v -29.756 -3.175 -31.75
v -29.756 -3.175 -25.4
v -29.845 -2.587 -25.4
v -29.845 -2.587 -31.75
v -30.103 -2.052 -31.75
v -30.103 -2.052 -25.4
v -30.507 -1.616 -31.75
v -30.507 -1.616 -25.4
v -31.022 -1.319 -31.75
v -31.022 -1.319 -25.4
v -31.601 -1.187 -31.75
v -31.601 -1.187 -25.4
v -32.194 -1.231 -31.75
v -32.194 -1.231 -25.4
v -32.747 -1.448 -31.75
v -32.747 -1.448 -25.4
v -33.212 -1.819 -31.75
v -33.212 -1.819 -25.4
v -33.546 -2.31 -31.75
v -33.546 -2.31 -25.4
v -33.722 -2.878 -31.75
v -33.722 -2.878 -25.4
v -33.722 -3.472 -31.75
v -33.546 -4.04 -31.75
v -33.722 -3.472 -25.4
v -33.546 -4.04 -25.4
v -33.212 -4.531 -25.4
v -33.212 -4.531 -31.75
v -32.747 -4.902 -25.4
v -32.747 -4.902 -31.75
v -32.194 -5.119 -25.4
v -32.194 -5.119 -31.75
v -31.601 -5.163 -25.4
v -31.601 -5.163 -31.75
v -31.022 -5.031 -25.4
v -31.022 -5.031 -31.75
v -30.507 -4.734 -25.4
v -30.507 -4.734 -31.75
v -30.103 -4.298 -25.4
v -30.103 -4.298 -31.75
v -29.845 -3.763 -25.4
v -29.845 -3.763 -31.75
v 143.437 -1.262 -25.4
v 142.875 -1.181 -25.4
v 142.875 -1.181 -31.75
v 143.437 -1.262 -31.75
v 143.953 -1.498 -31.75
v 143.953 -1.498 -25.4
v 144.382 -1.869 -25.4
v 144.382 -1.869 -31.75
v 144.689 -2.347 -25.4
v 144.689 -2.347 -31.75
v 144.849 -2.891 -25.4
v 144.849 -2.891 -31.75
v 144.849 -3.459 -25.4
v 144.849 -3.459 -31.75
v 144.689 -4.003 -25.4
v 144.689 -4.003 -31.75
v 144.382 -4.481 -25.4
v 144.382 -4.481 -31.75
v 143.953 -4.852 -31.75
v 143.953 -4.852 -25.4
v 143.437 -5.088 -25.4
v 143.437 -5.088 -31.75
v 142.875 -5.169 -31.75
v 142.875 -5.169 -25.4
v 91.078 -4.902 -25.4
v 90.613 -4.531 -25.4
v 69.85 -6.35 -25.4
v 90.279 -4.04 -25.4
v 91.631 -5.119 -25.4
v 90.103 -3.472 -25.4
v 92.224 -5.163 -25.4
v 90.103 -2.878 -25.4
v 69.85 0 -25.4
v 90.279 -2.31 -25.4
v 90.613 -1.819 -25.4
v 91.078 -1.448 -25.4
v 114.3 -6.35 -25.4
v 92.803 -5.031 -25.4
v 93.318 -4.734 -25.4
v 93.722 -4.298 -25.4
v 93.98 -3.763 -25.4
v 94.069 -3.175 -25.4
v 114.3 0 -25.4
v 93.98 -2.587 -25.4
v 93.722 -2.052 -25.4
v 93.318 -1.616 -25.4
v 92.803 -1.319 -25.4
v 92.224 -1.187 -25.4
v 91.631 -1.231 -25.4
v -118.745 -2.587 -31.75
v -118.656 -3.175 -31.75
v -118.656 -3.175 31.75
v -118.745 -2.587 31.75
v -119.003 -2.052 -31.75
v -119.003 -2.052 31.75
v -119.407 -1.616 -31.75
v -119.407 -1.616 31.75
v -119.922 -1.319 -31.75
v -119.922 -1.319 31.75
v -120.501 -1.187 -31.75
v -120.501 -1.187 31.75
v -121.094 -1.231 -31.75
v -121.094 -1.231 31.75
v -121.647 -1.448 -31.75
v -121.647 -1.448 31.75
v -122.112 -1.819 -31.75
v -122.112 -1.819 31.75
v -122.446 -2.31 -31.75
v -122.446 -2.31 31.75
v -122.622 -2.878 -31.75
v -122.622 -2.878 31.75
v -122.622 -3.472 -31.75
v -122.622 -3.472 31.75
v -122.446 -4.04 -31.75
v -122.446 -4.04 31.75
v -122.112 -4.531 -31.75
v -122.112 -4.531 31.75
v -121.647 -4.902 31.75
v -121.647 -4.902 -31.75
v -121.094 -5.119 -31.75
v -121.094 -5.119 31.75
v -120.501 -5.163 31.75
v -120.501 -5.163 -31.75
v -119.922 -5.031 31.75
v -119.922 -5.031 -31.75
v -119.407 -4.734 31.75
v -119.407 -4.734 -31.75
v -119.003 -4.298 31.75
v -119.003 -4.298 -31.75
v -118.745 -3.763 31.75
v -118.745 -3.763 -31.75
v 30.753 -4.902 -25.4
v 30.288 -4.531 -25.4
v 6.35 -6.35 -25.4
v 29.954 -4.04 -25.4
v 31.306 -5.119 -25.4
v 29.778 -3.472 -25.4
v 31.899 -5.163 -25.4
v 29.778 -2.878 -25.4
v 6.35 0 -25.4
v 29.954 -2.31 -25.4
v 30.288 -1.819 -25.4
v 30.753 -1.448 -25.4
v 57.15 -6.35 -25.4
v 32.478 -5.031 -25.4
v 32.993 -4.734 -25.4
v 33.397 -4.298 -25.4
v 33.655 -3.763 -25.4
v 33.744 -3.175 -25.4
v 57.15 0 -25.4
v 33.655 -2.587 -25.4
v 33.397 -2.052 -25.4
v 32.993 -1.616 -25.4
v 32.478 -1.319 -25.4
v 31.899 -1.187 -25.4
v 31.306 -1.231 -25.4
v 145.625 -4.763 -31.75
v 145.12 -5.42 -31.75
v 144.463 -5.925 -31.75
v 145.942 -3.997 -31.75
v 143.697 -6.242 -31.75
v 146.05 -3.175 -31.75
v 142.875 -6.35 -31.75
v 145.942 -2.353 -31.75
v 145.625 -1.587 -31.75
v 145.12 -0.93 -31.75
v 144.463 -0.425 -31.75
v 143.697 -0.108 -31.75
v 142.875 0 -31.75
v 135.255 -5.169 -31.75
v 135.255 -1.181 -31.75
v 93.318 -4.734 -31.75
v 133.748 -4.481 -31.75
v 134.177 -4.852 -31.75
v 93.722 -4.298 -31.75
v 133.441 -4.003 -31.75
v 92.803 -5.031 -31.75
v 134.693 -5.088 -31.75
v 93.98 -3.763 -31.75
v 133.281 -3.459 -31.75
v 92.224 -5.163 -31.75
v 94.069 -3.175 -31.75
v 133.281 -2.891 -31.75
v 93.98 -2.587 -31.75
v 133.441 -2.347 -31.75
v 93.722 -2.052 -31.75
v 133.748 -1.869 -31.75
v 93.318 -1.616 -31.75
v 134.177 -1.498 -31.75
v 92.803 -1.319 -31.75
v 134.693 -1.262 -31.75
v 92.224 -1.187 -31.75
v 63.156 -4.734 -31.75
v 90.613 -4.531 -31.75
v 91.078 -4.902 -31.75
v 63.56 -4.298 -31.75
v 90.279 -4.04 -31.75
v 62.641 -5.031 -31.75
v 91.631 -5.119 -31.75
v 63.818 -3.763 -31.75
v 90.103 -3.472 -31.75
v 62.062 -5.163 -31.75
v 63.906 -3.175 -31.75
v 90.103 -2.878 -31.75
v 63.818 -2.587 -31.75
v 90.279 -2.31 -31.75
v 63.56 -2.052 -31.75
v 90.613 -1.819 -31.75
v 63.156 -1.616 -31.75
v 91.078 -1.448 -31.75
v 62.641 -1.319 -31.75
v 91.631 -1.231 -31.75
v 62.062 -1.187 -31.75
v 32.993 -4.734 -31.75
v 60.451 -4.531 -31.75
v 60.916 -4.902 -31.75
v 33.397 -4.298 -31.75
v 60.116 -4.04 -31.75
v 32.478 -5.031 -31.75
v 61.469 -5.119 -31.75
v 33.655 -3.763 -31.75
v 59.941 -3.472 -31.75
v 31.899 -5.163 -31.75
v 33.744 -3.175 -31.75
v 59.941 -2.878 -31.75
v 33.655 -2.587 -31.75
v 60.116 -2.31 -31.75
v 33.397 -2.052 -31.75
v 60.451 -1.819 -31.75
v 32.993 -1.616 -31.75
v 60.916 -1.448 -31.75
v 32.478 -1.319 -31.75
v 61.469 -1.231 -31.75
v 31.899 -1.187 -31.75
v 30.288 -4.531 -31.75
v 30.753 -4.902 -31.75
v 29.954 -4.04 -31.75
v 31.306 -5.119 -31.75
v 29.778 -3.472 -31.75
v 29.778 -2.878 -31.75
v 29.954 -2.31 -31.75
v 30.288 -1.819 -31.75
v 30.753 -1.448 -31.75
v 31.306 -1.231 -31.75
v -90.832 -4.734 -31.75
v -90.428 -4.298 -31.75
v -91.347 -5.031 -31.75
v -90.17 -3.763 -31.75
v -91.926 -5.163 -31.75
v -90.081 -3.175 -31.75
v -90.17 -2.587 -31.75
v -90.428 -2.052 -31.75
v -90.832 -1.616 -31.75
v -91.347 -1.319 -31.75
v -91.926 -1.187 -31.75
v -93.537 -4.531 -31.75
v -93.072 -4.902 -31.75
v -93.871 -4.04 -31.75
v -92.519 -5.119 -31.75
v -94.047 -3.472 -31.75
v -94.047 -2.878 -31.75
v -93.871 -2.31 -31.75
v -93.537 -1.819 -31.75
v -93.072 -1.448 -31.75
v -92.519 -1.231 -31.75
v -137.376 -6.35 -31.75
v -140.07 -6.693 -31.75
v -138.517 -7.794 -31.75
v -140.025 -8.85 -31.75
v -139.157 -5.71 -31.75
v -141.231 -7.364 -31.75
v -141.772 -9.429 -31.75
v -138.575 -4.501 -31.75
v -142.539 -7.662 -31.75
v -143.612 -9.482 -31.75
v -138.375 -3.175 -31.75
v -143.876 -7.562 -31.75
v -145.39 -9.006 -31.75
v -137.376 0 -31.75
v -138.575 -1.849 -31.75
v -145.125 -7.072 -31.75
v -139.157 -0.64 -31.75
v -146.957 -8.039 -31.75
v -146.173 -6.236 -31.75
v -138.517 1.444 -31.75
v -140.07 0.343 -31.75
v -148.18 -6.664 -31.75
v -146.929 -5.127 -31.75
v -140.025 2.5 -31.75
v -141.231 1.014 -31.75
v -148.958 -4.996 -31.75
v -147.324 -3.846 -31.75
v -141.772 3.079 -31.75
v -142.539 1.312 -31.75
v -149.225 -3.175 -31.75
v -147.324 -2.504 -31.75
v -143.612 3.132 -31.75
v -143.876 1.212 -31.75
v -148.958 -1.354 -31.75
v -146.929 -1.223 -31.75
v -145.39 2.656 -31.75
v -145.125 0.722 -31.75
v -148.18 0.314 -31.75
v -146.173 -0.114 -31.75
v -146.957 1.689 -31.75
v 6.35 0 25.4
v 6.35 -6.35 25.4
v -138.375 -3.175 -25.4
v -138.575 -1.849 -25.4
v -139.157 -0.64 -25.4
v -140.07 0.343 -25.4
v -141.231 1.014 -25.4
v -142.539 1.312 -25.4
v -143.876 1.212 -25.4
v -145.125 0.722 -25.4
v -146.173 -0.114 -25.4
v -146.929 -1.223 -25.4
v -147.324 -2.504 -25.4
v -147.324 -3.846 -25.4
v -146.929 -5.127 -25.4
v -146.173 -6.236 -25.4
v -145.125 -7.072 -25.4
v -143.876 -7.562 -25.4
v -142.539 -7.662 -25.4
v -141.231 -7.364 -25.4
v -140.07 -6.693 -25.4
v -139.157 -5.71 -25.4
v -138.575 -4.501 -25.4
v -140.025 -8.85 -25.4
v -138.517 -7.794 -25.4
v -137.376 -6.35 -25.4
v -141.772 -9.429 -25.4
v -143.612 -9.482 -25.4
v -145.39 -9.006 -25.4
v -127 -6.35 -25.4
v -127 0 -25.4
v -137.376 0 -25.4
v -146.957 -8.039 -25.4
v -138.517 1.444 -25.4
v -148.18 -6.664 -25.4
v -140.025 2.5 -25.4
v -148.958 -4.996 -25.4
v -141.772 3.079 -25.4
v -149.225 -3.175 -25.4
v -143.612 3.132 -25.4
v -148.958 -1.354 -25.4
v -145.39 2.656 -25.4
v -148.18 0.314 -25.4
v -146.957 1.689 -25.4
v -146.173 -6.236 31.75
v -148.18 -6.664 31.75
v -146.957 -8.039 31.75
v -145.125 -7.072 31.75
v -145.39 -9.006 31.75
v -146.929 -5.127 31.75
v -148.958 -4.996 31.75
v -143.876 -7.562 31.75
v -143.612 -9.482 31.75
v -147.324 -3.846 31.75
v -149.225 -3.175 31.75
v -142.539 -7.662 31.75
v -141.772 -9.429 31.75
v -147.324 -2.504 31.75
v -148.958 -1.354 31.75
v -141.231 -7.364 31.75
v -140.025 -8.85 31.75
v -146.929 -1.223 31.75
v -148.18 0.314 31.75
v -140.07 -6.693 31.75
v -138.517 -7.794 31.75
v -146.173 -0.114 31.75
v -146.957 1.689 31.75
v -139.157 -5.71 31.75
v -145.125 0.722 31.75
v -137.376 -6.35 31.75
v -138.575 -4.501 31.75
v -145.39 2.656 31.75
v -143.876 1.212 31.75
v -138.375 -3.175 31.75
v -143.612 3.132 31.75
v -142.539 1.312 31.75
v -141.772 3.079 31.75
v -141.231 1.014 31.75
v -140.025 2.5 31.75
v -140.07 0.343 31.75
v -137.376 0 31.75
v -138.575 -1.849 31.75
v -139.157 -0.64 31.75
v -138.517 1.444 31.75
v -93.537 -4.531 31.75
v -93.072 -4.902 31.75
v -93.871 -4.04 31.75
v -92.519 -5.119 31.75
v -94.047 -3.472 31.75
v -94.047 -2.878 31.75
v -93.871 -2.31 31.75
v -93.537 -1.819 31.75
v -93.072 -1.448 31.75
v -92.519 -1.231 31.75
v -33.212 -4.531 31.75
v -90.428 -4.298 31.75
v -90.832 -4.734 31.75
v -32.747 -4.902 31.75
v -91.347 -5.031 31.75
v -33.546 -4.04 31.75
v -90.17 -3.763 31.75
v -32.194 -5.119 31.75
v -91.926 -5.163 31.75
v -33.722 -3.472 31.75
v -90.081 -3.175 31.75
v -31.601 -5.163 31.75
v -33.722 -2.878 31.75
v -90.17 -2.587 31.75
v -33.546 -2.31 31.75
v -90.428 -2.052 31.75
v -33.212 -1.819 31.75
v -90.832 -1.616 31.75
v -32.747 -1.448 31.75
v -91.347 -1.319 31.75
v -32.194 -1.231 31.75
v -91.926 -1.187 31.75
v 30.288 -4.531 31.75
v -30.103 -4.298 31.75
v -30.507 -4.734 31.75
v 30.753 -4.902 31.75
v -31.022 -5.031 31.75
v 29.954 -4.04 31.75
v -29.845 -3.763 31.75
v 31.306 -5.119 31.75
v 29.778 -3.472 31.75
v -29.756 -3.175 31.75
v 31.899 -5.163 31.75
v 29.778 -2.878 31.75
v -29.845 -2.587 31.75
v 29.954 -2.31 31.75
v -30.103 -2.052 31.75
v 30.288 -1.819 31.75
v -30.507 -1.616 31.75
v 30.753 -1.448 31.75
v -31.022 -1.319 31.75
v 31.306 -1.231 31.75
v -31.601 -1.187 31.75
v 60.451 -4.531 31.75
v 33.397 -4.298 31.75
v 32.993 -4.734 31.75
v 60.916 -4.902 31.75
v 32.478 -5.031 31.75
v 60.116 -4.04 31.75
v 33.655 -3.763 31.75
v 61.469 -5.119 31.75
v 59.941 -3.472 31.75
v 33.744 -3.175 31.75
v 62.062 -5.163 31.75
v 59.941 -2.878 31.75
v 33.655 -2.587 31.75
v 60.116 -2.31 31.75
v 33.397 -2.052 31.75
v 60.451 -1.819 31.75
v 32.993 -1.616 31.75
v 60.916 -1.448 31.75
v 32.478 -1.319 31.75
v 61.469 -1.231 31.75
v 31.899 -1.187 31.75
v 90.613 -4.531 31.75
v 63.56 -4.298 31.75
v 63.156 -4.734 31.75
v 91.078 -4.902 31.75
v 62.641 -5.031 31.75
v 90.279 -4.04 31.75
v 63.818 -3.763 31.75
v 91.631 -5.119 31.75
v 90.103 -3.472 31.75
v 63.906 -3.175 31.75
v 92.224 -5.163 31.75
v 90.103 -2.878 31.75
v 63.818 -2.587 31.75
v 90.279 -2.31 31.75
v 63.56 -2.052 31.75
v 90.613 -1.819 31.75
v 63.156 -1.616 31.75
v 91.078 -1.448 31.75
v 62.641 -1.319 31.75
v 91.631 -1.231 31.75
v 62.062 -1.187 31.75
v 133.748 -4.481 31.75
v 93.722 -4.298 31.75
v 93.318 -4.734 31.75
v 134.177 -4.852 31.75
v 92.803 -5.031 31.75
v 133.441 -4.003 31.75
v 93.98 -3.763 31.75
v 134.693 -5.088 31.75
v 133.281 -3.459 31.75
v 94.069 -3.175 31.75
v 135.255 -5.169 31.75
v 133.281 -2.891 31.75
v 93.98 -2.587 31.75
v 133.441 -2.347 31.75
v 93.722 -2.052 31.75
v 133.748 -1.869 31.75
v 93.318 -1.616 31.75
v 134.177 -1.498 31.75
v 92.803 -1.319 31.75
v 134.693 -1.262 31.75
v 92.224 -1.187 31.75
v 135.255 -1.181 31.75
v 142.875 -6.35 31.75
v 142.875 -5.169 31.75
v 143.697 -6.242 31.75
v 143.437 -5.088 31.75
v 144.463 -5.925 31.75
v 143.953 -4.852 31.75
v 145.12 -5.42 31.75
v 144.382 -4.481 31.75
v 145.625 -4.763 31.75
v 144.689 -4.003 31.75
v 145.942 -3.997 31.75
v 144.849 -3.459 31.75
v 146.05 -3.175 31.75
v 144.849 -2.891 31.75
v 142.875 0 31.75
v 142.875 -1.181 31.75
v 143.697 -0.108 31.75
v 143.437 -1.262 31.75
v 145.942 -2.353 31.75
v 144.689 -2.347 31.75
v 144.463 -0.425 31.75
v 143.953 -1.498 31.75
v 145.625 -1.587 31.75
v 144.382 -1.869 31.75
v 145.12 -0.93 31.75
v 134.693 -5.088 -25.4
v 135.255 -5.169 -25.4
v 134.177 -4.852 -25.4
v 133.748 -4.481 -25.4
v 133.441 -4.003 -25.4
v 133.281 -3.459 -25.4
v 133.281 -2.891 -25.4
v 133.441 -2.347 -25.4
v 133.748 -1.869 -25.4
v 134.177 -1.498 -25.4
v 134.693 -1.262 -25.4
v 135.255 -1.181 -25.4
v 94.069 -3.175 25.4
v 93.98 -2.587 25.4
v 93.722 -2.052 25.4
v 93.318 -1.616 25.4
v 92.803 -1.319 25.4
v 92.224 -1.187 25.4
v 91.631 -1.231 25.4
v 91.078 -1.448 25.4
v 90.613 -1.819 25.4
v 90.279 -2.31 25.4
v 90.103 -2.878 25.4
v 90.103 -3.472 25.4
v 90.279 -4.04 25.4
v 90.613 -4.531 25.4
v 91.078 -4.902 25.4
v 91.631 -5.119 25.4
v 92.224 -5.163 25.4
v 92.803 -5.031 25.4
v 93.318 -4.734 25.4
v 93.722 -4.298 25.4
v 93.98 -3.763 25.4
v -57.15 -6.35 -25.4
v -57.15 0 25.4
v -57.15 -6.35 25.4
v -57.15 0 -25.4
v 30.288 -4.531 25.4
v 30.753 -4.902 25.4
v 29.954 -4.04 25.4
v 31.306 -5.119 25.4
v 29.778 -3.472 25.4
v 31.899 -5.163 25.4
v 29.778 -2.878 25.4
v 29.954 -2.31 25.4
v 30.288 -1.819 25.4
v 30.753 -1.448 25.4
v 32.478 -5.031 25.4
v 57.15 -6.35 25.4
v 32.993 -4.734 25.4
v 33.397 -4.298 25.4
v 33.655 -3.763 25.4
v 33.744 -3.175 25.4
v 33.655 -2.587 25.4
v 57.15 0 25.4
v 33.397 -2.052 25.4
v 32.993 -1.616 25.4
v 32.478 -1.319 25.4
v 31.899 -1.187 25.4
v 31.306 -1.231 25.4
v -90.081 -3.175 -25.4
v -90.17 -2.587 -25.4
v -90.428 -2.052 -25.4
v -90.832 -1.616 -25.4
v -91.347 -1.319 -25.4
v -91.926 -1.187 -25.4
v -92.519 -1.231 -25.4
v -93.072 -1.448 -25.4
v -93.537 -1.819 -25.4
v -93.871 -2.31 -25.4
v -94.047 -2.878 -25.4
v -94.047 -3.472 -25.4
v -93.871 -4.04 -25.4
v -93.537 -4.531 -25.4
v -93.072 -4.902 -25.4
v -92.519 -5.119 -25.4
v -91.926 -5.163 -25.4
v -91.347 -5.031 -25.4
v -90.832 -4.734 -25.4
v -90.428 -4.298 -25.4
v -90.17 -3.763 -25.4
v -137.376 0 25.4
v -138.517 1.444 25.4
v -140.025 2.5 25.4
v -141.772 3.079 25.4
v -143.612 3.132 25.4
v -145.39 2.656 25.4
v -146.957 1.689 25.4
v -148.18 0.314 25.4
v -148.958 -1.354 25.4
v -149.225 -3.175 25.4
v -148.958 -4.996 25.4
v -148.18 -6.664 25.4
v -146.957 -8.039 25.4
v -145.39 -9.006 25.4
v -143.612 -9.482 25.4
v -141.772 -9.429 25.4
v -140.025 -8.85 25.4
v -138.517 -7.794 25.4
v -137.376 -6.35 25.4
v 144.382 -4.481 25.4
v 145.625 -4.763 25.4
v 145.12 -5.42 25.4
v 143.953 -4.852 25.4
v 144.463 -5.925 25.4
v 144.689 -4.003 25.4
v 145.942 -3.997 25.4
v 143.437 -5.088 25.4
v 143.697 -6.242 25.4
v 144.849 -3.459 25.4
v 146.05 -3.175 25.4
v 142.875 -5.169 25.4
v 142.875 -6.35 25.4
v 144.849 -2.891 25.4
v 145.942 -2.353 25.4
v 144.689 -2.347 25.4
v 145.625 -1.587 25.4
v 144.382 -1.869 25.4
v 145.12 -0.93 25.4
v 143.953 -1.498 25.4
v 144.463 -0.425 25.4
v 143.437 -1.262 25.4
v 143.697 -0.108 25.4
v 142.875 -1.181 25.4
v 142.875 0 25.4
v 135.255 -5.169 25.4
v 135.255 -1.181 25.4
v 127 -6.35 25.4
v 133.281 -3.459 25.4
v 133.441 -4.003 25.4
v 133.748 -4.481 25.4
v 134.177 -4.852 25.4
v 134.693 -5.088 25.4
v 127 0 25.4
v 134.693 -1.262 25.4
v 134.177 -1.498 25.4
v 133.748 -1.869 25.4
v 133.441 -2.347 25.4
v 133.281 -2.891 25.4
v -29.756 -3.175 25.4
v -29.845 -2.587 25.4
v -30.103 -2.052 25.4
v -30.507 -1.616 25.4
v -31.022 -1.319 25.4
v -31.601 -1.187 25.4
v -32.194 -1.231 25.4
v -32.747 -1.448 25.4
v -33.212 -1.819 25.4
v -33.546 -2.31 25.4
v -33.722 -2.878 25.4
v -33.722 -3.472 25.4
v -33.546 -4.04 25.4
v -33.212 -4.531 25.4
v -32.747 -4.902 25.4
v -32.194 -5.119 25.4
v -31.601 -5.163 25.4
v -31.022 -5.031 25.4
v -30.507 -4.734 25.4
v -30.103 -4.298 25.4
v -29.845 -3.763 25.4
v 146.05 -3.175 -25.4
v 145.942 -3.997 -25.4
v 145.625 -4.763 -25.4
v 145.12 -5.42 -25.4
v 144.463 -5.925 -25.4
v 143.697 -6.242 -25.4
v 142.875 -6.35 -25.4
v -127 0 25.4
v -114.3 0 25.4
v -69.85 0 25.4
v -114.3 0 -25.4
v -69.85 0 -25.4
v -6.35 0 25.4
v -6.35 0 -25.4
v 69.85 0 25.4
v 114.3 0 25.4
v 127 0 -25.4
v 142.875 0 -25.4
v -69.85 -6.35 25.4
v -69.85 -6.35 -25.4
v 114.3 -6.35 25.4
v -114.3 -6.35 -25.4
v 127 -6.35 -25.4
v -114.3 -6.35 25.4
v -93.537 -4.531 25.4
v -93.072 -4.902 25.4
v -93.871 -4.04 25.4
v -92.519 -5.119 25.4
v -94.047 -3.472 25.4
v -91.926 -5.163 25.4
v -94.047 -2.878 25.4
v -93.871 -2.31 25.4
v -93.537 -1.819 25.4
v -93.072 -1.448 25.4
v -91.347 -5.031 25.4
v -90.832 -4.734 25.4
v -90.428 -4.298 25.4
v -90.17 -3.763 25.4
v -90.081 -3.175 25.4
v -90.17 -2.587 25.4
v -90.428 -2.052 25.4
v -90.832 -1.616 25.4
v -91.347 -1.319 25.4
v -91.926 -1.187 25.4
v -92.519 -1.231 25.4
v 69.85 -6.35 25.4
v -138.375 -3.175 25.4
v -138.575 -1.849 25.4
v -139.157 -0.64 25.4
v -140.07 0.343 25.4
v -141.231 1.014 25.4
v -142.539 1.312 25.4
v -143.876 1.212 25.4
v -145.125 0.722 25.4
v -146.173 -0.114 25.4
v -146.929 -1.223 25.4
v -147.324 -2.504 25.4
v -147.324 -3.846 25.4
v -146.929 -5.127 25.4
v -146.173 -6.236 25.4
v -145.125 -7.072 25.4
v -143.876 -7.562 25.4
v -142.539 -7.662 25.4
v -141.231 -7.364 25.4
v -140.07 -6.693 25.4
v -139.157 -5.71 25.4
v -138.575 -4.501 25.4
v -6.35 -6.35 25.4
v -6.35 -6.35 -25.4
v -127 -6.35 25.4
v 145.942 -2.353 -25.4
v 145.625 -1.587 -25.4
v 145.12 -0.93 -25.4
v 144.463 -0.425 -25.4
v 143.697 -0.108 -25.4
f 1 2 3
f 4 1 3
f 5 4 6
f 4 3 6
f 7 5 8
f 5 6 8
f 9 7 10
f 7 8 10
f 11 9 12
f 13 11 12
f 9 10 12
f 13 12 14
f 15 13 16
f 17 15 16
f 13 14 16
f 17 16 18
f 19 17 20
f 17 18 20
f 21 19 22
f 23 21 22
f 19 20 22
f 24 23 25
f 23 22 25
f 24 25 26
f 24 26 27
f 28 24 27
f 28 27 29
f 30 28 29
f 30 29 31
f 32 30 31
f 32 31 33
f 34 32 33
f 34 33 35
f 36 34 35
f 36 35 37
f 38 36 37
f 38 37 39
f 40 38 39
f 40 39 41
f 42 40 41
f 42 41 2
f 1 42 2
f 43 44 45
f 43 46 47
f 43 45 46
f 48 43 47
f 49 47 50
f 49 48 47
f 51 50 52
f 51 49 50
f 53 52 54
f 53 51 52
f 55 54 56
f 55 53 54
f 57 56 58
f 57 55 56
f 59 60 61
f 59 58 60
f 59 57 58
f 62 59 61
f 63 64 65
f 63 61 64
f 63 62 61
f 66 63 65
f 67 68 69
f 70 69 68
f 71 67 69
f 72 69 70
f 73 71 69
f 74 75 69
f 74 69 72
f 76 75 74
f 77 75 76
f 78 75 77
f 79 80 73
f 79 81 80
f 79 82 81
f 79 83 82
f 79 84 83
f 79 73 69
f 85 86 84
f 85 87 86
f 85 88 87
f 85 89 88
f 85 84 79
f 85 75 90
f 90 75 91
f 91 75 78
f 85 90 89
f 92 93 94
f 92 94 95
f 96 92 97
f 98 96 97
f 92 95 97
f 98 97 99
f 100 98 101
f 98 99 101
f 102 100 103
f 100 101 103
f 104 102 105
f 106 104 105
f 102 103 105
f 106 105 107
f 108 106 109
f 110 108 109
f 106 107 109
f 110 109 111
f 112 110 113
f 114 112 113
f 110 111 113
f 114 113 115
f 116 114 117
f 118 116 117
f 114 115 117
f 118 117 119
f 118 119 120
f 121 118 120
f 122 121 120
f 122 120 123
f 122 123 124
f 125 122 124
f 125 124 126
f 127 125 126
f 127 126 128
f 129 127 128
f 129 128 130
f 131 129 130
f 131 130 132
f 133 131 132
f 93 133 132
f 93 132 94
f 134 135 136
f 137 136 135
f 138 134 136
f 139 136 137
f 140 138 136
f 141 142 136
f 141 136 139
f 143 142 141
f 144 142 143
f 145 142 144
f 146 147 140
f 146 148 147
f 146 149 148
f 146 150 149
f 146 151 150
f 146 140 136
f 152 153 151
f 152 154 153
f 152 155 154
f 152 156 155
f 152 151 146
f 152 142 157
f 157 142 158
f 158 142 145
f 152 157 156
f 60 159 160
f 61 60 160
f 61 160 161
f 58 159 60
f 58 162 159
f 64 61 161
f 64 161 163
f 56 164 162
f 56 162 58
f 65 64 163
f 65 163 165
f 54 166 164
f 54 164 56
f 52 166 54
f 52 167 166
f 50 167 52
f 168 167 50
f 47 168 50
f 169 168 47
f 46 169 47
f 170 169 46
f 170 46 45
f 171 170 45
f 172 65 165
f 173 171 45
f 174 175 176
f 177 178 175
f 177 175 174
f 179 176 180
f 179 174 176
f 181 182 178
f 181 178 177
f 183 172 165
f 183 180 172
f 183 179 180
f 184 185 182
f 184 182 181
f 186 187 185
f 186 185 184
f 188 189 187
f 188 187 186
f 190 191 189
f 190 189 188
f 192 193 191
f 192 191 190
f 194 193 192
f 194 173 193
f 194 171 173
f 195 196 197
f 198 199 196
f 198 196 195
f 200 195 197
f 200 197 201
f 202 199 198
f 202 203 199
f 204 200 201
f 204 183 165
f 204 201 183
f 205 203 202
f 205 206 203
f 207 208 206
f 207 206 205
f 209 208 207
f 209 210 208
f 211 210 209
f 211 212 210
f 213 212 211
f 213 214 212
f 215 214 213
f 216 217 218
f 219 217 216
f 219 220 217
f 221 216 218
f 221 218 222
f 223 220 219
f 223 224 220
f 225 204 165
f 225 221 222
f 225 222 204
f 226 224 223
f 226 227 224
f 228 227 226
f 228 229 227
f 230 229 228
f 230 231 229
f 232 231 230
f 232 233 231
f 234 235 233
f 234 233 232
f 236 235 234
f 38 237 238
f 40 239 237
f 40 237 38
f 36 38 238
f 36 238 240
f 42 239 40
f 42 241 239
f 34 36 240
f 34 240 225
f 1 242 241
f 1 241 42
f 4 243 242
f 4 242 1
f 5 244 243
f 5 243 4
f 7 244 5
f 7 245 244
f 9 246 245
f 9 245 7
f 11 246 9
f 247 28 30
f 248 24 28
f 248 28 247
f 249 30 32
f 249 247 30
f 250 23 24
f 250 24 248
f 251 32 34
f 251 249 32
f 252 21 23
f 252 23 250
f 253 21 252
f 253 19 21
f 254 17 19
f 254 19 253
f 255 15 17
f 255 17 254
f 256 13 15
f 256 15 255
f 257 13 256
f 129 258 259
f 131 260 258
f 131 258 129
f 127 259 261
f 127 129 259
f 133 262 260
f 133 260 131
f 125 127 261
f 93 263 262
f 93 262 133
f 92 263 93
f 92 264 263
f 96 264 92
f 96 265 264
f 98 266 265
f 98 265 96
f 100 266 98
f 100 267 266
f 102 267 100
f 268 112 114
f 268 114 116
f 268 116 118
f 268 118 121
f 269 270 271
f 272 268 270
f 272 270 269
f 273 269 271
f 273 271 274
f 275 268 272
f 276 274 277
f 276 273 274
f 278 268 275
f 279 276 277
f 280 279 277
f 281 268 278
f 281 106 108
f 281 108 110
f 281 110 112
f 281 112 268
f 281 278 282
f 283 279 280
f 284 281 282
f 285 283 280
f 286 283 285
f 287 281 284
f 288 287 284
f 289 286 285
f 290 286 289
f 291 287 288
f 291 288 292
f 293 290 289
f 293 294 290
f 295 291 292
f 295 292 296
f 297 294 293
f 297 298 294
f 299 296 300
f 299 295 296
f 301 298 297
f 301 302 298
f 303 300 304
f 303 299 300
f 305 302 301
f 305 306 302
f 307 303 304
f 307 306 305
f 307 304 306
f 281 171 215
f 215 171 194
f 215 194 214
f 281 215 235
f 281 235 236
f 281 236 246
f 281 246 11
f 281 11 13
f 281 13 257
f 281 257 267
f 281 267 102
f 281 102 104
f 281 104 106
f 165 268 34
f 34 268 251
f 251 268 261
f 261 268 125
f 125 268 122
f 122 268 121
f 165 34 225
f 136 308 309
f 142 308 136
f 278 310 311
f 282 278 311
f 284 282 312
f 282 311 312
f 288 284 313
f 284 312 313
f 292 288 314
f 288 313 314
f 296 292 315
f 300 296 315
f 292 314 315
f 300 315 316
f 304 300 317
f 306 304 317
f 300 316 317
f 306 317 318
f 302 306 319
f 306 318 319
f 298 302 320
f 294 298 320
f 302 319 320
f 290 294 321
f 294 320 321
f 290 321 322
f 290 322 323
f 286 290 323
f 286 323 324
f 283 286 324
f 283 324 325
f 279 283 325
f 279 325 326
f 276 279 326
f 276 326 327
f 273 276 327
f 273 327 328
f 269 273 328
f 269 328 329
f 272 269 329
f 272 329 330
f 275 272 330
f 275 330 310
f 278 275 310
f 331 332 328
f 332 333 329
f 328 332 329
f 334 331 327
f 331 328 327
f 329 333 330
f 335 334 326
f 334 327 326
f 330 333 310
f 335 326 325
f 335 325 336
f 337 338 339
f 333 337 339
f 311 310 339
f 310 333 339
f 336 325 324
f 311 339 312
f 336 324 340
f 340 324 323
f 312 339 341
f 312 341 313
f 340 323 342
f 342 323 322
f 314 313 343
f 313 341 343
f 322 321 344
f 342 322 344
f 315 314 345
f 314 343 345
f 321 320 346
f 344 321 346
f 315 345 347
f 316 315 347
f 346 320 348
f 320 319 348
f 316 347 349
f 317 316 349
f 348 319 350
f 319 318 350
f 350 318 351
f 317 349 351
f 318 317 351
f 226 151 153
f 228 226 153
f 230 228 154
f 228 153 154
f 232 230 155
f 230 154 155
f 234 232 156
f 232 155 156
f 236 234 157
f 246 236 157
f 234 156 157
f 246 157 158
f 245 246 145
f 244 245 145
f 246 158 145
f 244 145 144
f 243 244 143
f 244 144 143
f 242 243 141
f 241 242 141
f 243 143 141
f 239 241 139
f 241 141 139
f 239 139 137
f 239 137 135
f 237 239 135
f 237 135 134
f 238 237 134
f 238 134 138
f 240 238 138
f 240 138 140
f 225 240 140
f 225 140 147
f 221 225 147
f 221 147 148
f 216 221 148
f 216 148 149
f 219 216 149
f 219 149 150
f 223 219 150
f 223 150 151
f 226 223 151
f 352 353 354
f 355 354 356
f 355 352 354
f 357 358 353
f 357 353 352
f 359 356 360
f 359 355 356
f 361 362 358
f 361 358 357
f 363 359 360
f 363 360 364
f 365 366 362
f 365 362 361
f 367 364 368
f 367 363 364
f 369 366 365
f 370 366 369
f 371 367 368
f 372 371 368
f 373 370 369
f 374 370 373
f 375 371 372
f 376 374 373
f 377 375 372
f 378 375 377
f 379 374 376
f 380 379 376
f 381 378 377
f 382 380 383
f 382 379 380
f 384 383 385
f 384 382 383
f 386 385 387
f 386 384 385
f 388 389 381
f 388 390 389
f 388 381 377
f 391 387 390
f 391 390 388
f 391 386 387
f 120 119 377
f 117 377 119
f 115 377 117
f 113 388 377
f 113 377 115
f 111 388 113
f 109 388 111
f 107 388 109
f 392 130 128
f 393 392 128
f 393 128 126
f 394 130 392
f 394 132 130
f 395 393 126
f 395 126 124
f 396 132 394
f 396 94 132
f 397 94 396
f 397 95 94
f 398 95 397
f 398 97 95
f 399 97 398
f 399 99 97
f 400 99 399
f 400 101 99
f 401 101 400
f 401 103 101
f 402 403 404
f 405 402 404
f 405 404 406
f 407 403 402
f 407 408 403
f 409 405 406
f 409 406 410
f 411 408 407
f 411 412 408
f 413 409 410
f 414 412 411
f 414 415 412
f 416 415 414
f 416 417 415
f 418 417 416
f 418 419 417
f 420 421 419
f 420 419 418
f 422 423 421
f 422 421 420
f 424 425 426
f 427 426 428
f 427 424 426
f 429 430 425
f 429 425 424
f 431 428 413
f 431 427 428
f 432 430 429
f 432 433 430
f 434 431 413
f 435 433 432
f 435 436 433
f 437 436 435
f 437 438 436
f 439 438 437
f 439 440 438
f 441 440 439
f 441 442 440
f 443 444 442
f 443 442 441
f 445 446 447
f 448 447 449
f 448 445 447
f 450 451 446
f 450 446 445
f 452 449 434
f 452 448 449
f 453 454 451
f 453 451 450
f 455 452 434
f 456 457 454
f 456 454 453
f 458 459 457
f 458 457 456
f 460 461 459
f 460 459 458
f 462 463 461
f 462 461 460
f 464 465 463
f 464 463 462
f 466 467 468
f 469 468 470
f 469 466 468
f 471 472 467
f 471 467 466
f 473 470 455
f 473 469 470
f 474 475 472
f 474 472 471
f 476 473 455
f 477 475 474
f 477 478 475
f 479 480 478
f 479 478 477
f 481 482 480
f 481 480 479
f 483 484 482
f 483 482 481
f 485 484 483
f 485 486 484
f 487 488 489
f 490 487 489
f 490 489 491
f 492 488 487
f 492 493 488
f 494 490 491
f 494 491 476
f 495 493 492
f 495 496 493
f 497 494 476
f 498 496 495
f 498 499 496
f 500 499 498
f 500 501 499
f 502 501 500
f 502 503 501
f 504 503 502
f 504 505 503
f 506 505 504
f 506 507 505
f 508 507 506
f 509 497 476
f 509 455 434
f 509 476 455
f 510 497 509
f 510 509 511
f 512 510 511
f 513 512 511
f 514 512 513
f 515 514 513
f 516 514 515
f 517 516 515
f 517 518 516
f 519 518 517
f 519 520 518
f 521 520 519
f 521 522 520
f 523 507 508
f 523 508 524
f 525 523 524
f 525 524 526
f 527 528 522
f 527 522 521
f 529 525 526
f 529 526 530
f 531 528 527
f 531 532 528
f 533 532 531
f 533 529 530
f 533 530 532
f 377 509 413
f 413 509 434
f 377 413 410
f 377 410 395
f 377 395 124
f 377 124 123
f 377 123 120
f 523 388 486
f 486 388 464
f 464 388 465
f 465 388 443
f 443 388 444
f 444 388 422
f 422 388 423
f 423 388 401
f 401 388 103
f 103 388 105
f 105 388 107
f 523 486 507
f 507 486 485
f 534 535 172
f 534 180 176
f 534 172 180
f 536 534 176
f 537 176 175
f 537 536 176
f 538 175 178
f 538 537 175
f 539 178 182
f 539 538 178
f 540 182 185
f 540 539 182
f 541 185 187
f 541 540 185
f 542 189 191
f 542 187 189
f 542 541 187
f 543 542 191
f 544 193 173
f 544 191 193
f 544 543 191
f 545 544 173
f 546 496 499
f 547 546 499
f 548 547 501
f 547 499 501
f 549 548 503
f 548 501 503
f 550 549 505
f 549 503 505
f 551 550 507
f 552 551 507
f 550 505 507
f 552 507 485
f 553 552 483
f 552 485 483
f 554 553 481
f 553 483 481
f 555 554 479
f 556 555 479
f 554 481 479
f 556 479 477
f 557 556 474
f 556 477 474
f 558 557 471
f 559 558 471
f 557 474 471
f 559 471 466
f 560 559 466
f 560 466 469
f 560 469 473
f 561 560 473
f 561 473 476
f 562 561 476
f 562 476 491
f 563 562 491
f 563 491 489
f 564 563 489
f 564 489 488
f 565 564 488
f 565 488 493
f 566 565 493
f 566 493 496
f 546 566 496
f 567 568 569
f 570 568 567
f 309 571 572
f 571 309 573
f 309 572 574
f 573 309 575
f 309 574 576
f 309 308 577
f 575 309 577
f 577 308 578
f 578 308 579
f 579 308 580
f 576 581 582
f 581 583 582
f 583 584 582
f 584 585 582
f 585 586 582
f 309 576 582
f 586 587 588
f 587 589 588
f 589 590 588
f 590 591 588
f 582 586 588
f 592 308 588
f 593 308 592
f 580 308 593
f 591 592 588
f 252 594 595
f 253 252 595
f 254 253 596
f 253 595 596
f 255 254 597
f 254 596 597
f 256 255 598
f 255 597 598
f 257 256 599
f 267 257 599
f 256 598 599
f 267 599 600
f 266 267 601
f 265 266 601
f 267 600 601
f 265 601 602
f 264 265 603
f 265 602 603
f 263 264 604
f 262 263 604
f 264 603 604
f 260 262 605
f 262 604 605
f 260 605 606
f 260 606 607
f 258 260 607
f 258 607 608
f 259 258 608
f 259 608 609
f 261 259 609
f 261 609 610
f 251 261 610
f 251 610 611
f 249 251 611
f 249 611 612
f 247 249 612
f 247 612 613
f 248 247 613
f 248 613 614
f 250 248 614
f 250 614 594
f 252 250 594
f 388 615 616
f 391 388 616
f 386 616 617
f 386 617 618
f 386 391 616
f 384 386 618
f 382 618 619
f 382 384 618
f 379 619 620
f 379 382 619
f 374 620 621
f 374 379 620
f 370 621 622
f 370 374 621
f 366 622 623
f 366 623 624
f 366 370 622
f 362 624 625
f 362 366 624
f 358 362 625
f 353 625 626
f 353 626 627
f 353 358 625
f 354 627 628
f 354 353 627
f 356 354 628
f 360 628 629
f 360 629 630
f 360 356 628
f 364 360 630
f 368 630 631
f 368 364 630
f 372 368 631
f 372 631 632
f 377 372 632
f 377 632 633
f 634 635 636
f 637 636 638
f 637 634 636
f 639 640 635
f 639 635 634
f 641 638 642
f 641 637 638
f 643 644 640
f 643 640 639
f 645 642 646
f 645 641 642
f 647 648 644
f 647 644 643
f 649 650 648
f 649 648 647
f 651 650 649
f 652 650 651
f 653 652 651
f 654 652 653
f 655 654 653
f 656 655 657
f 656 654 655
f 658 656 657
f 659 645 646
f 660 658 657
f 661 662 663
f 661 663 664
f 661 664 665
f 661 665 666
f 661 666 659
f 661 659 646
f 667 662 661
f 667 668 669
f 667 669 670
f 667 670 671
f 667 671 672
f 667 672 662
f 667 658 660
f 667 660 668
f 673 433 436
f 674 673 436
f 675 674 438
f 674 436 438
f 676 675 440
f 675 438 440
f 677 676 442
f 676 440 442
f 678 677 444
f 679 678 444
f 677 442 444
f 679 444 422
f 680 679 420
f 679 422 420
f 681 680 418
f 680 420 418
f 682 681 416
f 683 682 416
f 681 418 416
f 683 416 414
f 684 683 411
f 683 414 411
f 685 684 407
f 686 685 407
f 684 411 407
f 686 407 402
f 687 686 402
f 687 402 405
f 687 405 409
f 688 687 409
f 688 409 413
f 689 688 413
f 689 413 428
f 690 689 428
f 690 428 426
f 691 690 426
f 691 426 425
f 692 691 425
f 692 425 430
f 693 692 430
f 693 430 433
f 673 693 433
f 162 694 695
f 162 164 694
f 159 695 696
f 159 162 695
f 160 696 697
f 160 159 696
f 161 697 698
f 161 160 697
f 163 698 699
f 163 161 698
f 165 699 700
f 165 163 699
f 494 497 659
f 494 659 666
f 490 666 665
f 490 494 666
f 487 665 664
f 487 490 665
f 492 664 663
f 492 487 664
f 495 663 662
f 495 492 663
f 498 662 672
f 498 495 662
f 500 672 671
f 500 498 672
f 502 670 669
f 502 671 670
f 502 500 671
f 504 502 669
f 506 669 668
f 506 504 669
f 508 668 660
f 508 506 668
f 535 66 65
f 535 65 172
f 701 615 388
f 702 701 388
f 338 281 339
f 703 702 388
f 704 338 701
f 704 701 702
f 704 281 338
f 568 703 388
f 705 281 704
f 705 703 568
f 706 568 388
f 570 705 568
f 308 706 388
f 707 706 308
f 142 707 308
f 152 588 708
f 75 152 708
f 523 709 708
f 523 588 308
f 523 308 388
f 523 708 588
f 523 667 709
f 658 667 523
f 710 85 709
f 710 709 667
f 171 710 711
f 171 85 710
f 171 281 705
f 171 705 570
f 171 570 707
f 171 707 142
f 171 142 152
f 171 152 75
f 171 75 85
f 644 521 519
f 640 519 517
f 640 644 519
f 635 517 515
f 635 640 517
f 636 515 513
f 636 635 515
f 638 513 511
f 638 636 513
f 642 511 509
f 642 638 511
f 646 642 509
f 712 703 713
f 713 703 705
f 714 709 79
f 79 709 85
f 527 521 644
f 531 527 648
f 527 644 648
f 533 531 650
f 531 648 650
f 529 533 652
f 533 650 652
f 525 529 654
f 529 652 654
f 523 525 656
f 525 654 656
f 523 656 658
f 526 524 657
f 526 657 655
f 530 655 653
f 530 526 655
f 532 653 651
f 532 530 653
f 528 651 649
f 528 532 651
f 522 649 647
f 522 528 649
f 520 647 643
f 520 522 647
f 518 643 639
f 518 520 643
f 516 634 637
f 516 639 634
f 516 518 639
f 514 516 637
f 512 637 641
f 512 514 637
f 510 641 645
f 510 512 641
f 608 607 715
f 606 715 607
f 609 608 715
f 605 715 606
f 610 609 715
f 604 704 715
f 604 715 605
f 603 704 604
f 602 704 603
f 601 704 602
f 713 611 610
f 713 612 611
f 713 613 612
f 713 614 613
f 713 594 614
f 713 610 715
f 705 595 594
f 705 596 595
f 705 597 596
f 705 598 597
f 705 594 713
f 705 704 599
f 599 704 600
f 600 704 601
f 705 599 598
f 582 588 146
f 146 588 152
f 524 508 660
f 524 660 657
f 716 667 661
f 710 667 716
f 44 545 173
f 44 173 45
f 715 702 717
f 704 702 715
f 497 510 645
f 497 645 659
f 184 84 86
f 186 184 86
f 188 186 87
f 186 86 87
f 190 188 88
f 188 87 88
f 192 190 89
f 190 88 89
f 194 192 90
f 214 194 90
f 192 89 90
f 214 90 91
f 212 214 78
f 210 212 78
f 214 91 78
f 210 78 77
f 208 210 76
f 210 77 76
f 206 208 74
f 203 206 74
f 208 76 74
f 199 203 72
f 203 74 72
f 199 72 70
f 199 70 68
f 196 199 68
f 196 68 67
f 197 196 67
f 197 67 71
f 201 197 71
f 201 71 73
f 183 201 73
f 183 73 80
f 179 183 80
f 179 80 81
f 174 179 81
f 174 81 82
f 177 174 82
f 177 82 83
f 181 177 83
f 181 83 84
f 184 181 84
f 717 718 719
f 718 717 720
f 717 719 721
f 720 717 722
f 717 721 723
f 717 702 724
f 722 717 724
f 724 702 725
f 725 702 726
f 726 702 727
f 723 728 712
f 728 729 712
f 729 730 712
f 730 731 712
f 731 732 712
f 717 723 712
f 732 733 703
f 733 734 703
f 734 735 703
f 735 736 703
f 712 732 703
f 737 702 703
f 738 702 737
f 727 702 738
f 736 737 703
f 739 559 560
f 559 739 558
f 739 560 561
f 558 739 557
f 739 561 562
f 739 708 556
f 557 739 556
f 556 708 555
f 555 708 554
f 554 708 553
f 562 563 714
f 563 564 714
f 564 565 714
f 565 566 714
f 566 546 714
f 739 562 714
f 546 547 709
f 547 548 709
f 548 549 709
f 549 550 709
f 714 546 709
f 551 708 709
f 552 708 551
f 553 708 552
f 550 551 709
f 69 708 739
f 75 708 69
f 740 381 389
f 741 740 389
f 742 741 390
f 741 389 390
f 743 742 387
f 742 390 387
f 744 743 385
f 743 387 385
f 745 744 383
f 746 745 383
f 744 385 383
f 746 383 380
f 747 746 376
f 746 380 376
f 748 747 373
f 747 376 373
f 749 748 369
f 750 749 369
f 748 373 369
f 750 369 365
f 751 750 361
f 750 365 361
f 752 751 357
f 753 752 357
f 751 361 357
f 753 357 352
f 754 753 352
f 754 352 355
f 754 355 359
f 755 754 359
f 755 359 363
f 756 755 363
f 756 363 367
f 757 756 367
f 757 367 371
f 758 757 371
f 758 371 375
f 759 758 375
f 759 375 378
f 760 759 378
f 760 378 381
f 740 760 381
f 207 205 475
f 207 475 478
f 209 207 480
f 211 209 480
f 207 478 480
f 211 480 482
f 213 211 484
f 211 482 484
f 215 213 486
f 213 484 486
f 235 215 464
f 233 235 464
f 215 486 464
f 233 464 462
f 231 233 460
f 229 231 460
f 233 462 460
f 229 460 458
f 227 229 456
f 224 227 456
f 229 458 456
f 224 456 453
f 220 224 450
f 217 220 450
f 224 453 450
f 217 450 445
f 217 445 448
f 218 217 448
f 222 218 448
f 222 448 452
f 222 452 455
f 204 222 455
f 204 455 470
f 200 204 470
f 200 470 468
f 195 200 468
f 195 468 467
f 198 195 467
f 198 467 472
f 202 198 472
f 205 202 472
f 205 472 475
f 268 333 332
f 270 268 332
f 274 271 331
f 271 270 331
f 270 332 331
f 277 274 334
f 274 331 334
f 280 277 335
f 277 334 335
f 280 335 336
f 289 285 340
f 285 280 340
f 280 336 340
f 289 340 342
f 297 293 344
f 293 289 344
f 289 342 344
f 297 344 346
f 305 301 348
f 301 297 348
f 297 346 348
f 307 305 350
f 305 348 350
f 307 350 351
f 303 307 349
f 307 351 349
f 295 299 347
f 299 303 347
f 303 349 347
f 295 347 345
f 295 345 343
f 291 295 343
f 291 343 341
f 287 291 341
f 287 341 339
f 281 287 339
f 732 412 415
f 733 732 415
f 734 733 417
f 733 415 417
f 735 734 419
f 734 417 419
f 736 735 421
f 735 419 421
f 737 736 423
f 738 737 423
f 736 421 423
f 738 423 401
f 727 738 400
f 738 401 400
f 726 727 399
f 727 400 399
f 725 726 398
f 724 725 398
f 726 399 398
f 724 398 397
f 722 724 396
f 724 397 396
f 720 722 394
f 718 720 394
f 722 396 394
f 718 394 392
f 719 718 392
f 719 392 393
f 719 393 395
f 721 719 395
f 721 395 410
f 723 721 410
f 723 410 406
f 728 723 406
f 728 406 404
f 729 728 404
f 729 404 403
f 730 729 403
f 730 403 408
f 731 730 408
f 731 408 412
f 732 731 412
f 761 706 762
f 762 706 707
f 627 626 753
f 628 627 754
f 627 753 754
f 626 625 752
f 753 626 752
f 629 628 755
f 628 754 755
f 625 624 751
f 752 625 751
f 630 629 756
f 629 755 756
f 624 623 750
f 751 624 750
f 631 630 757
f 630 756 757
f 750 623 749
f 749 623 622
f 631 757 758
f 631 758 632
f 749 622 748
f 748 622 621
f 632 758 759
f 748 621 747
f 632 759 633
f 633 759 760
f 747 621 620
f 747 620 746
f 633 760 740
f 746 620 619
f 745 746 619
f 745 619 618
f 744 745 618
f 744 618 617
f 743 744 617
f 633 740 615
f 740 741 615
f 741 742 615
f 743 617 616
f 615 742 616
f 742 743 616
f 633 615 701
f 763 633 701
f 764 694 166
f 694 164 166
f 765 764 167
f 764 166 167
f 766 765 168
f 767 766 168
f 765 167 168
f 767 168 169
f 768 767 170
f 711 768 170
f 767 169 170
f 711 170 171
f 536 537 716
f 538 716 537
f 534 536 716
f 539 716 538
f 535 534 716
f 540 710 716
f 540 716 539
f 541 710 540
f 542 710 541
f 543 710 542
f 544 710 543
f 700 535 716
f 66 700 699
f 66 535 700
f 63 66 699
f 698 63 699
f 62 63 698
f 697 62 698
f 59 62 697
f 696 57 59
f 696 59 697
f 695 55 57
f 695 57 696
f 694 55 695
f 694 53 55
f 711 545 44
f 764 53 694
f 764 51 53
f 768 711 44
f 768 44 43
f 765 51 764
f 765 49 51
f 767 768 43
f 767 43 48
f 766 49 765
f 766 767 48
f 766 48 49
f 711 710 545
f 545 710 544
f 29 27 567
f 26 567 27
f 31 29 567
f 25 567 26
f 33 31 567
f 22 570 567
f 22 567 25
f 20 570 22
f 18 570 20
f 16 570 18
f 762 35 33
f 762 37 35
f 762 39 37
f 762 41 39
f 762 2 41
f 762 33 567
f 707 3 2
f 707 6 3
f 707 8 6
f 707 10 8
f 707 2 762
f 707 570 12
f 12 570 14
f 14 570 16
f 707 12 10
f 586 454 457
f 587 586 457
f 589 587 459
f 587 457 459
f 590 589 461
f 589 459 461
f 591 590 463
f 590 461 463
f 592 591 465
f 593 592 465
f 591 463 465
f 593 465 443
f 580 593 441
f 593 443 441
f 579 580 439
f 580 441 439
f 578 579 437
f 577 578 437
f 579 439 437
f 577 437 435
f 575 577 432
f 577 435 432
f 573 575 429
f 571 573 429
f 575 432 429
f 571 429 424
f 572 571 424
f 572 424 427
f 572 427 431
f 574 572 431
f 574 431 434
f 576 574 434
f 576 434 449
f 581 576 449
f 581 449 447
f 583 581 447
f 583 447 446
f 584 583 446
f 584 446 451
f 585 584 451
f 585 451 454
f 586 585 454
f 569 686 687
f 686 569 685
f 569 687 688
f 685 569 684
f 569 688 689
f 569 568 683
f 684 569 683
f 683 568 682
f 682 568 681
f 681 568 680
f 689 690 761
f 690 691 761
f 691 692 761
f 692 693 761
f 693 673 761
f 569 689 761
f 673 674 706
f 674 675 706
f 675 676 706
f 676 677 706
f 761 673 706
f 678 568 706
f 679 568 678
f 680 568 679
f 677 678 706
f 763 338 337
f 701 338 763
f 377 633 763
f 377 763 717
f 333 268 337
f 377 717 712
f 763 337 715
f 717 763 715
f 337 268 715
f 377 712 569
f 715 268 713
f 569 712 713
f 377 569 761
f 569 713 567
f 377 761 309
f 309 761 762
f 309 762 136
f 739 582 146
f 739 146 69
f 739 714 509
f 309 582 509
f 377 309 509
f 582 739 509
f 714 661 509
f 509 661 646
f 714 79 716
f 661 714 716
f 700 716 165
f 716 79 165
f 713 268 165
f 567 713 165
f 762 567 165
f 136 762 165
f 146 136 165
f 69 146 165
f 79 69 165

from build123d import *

# Parameters (mm, degrees)
SKETCH1_W           = 50.8
SKETCH1_H           = 50.8
SKETCH1_W_2         = 44.45
BOSS_EXTRUDE1_DEPTH = 6.35
FILLET2_R           = 3.175
SKETCH2_R           = 6.35
BOSS_EXTRUDE3_DEPTH = 6.35
BOSS_EXTRUDE4_START = -6.35
SKETCH4_R           = 6.35
BOSS_EXTRUDE4_DEPTH = 6.35
CUT_EXTRUDE1_REACH  = 164.453
SKETCH2_4_R         = 4.49961
SKETCH2_4_R_2       = 1.9939


with BuildPart() as part:
    # Sketch1 → Boss-Extrude1 (new body)
    with BuildSketch(Plane(origin=(0, 0, 0), x_dir=(1, 0, 0), z_dir=(0, 1, 0))):
        Polygon((-146.05, 25.4), (-127, 25.4), (-127, -25.4), (-146.05, -25.4), (-146.05, -31.75), (146.05, -31.75), (146.05, -25.4), (127, -25.4), (127, 25.4), (146.05, 25.4), (146.05, 31.75), (-146.05, 31.75), align=None)
        with Locations((-31.75, 0)):
            Rectangle(SKETCH1_W, SKETCH1_H, mode=Mode.SUBTRACT)
        with Locations((-92.075, 0)):
            Rectangle(SKETCH1_W_2, SKETCH1_H, mode=Mode.SUBTRACT)
        with Locations((31.75, 0)):
            Rectangle(SKETCH1_W, SKETCH1_H, mode=Mode.SUBTRACT)
        with Locations((92.075, 0)):
            Rectangle(SKETCH1_W_2, SKETCH1_H, mode=Mode.SUBTRACT)
    extrude(amount=-BOSS_EXTRUDE1_DEPTH)

    # Fillet2
    fillet2_edges = [part.edges().sort_by_distance(p)[0] for p in [
        (-146.05, -6.35, 28.575),
        (-146.05, 0, 28.575),
        (-146.05, -6.35, -28.575),
        (-146.05, 0, -28.575),
        (146.05, -6.35, -28.575),
        (146.05, 0, -28.575),
        (146.05, -6.35, 28.575),
        (146.05, 0, 28.575),
    ]]
    fillet(fillet2_edges, radius=FILLET2_R - 0.0001)  # a hair under: the kernel refuses the full size

    # Sketch2 → Boss-Extrude3 (add)
    with BuildSketch(Plane.XY.offset(31.75)):
        with Locations((-142.875, -3.175)):
            Circle(SKETCH2_R)
    extrude(amount=-BOSS_EXTRUDE3_DEPTH)

    # Sketch4 → Boss-Extrude4 (add)
    with BuildSketch(Plane(origin=(0, 0, -31.75), x_dir=(-1, 0, 0), z_dir=(0, 0, -1)).offset(BOSS_EXTRUDE4_START)):
        with Locations((142.875, -3.175)):
            Circle(SKETCH4_R)
    extrude(amount=BOSS_EXTRUDE4_DEPTH)

    # Cut-Extrude1: up to this face of the body (flat: up to its plane)
    cut_extrude1_end = Plane(part.part.faces().sort_by_distance((-5.43222234, -3.175, -31.75))[0])
    # Sketch2<4> → Cut-Extrude1 (cut, up to the picked face)
    with BuildSketch(Plane.XY.offset(31.75), mode=Mode.PRIVATE) as cut_extrude1_sk1:
        with Locations((-142.875, -3.175)):
            Circle(SKETCH2_4_R)
    cut_extrude1_tool1 = split(extrude(cut_extrude1_sk1.sketch, amount=-CUT_EXTRUDE1_REACH, mode=Mode.PRIVATE), bisect_by=cut_extrude1_end, keep=Keep.BOTH, mode=Mode.PRIVATE)
    # Sketch2<4> → Cut-Extrude1 (cut, up to the picked face)
    with BuildSketch(Plane.XY.offset(31.75), mode=Mode.PRIVATE) as cut_extrude1_sk2:
        with Locations((-92.075, -3.175)):
            Circle(SKETCH2_4_R_2)
    cut_extrude1_tool2 = split(extrude(cut_extrude1_sk2.sketch, amount=-CUT_EXTRUDE1_REACH, mode=Mode.PRIVATE), bisect_by=cut_extrude1_end, keep=Keep.BOTH, mode=Mode.PRIVATE)
    # Sketch2<4> → Cut-Extrude1 (cut, up to the picked face)
    with BuildSketch(Plane.XY.offset(31.75), mode=Mode.PRIVATE) as cut_extrude1_sk3:
        with Locations((-31.75, -3.175)):
            Circle(SKETCH2_4_R_2)
    cut_extrude1_tool3 = split(extrude(cut_extrude1_sk3.sketch, amount=-CUT_EXTRUDE1_REACH, mode=Mode.PRIVATE), bisect_by=cut_extrude1_end, keep=Keep.BOTH, mode=Mode.PRIVATE)
    # Sketch2<4> → Cut-Extrude1 (cut, up to the picked face)
    with BuildSketch(Plane.XY.offset(31.75), mode=Mode.PRIVATE) as cut_extrude1_sk4:
        with Locations((31.75, -3.175)):
            Circle(SKETCH2_4_R_2)
    cut_extrude1_tool4 = split(extrude(cut_extrude1_sk4.sketch, amount=-CUT_EXTRUDE1_REACH, mode=Mode.PRIVATE), bisect_by=cut_extrude1_end, keep=Keep.BOTH, mode=Mode.PRIVATE)
    # Sketch2<4> → Cut-Extrude1 (cut, up to the picked face)
    with BuildSketch(Plane.XY.offset(31.75), mode=Mode.PRIVATE) as cut_extrude1_sk5:
        with Locations((92.075, -3.175)):
            Circle(SKETCH2_4_R_2)
    cut_extrude1_tool5 = split(extrude(cut_extrude1_sk5.sketch, amount=-CUT_EXTRUDE1_REACH, mode=Mode.PRIVATE), bisect_by=cut_extrude1_end, keep=Keep.BOTH, mode=Mode.PRIVATE)
    # Sketch2<4> → Cut-Extrude1 (cut, up to the picked face)
    with BuildSketch(Plane.XY.offset(31.75), mode=Mode.PRIVATE) as cut_extrude1_sk6:
        with Locations((-120.65, -3.175)):
            Circle(SKETCH2_4_R_2)
    cut_extrude1_tool6 = split(extrude(cut_extrude1_sk6.sketch, amount=-CUT_EXTRUDE1_REACH, mode=Mode.PRIVATE), bisect_by=cut_extrude1_end, keep=Keep.BOTH, mode=Mode.PRIVATE)
    # Sketch2<4> → Cut-Extrude1 (cut, up to the picked face)
    with BuildSketch(Plane.XY.offset(31.75), mode=Mode.PRIVATE) as cut_extrude1_sk7:
        with Locations((61.9125, -3.175)):
            Circle(SKETCH2_4_R_2)
    cut_extrude1_tool7 = split(extrude(cut_extrude1_sk7.sketch, amount=-CUT_EXTRUDE1_REACH, mode=Mode.PRIVATE), bisect_by=cut_extrude1_end, keep=Keep.BOTH, mode=Mode.PRIVATE)
    # Sketch2<4> → Cut-Extrude1 (cut, up to the picked face)
    with BuildSketch(Plane.XY.offset(31.75), mode=Mode.PRIVATE) as cut_extrude1_sk8:
        with BuildLine():
            Line((135.255, -1.1811), (142.875, -1.1811))
            ThreePointArc((142.875, -1.1811), (144.8689, -3.175), (142.875, -5.1689))
            Line((142.875, -5.1689), (135.255, -5.1689))
            ThreePointArc((135.255, -5.1689), (133.2611, -3.175), (135.255, -1.1811))
        make_face()
    cut_extrude1_tool8 = split(extrude(cut_extrude1_sk8.sketch, amount=-CUT_EXTRUDE1_REACH, mode=Mode.PRIVATE), bisect_by=cut_extrude1_end, keep=Keep.BOTH, mode=Mode.PRIVATE)
    add(cut_extrude1_tool1.solids().sort_by(Axis((-142.875, -3.175, 31.75), (0, 0, -1)))[0], mode=Mode.SUBTRACT)
    add(cut_extrude1_tool2.solids().sort_by(Axis((-92.075, -3.175, 31.75), (0, 0, -1)))[0], mode=Mode.SUBTRACT)
    add(cut_extrude1_tool3.solids().sort_by(Axis((-31.75, -3.175, 31.75), (0, 0, -1)))[0], mode=Mode.SUBTRACT)
    add(cut_extrude1_tool4.solids().sort_by(Axis((31.75, -3.175, 31.75), (0, 0, -1)))[0], mode=Mode.SUBTRACT)
    add(cut_extrude1_tool5.solids().sort_by(Axis((92.075, -3.175, 31.75), (0, 0, -1)))[0], mode=Mode.SUBTRACT)
    add(cut_extrude1_tool6.solids().sort_by(Axis((-120.65, -3.175, 31.75), (0, 0, -1)))[0], mode=Mode.SUBTRACT)
    add(cut_extrude1_tool7.solids().sort_by(Axis((61.9125, -3.175, 31.75), (0, 0, -1)))[0], mode=Mode.SUBTRACT)
    add(cut_extrude1_tool8.solids().sort_by(Axis((139.065, -3.175, 31.75), (0, 0, -1)))[0], mode=Mode.SUBTRACT)


solid = part.part
